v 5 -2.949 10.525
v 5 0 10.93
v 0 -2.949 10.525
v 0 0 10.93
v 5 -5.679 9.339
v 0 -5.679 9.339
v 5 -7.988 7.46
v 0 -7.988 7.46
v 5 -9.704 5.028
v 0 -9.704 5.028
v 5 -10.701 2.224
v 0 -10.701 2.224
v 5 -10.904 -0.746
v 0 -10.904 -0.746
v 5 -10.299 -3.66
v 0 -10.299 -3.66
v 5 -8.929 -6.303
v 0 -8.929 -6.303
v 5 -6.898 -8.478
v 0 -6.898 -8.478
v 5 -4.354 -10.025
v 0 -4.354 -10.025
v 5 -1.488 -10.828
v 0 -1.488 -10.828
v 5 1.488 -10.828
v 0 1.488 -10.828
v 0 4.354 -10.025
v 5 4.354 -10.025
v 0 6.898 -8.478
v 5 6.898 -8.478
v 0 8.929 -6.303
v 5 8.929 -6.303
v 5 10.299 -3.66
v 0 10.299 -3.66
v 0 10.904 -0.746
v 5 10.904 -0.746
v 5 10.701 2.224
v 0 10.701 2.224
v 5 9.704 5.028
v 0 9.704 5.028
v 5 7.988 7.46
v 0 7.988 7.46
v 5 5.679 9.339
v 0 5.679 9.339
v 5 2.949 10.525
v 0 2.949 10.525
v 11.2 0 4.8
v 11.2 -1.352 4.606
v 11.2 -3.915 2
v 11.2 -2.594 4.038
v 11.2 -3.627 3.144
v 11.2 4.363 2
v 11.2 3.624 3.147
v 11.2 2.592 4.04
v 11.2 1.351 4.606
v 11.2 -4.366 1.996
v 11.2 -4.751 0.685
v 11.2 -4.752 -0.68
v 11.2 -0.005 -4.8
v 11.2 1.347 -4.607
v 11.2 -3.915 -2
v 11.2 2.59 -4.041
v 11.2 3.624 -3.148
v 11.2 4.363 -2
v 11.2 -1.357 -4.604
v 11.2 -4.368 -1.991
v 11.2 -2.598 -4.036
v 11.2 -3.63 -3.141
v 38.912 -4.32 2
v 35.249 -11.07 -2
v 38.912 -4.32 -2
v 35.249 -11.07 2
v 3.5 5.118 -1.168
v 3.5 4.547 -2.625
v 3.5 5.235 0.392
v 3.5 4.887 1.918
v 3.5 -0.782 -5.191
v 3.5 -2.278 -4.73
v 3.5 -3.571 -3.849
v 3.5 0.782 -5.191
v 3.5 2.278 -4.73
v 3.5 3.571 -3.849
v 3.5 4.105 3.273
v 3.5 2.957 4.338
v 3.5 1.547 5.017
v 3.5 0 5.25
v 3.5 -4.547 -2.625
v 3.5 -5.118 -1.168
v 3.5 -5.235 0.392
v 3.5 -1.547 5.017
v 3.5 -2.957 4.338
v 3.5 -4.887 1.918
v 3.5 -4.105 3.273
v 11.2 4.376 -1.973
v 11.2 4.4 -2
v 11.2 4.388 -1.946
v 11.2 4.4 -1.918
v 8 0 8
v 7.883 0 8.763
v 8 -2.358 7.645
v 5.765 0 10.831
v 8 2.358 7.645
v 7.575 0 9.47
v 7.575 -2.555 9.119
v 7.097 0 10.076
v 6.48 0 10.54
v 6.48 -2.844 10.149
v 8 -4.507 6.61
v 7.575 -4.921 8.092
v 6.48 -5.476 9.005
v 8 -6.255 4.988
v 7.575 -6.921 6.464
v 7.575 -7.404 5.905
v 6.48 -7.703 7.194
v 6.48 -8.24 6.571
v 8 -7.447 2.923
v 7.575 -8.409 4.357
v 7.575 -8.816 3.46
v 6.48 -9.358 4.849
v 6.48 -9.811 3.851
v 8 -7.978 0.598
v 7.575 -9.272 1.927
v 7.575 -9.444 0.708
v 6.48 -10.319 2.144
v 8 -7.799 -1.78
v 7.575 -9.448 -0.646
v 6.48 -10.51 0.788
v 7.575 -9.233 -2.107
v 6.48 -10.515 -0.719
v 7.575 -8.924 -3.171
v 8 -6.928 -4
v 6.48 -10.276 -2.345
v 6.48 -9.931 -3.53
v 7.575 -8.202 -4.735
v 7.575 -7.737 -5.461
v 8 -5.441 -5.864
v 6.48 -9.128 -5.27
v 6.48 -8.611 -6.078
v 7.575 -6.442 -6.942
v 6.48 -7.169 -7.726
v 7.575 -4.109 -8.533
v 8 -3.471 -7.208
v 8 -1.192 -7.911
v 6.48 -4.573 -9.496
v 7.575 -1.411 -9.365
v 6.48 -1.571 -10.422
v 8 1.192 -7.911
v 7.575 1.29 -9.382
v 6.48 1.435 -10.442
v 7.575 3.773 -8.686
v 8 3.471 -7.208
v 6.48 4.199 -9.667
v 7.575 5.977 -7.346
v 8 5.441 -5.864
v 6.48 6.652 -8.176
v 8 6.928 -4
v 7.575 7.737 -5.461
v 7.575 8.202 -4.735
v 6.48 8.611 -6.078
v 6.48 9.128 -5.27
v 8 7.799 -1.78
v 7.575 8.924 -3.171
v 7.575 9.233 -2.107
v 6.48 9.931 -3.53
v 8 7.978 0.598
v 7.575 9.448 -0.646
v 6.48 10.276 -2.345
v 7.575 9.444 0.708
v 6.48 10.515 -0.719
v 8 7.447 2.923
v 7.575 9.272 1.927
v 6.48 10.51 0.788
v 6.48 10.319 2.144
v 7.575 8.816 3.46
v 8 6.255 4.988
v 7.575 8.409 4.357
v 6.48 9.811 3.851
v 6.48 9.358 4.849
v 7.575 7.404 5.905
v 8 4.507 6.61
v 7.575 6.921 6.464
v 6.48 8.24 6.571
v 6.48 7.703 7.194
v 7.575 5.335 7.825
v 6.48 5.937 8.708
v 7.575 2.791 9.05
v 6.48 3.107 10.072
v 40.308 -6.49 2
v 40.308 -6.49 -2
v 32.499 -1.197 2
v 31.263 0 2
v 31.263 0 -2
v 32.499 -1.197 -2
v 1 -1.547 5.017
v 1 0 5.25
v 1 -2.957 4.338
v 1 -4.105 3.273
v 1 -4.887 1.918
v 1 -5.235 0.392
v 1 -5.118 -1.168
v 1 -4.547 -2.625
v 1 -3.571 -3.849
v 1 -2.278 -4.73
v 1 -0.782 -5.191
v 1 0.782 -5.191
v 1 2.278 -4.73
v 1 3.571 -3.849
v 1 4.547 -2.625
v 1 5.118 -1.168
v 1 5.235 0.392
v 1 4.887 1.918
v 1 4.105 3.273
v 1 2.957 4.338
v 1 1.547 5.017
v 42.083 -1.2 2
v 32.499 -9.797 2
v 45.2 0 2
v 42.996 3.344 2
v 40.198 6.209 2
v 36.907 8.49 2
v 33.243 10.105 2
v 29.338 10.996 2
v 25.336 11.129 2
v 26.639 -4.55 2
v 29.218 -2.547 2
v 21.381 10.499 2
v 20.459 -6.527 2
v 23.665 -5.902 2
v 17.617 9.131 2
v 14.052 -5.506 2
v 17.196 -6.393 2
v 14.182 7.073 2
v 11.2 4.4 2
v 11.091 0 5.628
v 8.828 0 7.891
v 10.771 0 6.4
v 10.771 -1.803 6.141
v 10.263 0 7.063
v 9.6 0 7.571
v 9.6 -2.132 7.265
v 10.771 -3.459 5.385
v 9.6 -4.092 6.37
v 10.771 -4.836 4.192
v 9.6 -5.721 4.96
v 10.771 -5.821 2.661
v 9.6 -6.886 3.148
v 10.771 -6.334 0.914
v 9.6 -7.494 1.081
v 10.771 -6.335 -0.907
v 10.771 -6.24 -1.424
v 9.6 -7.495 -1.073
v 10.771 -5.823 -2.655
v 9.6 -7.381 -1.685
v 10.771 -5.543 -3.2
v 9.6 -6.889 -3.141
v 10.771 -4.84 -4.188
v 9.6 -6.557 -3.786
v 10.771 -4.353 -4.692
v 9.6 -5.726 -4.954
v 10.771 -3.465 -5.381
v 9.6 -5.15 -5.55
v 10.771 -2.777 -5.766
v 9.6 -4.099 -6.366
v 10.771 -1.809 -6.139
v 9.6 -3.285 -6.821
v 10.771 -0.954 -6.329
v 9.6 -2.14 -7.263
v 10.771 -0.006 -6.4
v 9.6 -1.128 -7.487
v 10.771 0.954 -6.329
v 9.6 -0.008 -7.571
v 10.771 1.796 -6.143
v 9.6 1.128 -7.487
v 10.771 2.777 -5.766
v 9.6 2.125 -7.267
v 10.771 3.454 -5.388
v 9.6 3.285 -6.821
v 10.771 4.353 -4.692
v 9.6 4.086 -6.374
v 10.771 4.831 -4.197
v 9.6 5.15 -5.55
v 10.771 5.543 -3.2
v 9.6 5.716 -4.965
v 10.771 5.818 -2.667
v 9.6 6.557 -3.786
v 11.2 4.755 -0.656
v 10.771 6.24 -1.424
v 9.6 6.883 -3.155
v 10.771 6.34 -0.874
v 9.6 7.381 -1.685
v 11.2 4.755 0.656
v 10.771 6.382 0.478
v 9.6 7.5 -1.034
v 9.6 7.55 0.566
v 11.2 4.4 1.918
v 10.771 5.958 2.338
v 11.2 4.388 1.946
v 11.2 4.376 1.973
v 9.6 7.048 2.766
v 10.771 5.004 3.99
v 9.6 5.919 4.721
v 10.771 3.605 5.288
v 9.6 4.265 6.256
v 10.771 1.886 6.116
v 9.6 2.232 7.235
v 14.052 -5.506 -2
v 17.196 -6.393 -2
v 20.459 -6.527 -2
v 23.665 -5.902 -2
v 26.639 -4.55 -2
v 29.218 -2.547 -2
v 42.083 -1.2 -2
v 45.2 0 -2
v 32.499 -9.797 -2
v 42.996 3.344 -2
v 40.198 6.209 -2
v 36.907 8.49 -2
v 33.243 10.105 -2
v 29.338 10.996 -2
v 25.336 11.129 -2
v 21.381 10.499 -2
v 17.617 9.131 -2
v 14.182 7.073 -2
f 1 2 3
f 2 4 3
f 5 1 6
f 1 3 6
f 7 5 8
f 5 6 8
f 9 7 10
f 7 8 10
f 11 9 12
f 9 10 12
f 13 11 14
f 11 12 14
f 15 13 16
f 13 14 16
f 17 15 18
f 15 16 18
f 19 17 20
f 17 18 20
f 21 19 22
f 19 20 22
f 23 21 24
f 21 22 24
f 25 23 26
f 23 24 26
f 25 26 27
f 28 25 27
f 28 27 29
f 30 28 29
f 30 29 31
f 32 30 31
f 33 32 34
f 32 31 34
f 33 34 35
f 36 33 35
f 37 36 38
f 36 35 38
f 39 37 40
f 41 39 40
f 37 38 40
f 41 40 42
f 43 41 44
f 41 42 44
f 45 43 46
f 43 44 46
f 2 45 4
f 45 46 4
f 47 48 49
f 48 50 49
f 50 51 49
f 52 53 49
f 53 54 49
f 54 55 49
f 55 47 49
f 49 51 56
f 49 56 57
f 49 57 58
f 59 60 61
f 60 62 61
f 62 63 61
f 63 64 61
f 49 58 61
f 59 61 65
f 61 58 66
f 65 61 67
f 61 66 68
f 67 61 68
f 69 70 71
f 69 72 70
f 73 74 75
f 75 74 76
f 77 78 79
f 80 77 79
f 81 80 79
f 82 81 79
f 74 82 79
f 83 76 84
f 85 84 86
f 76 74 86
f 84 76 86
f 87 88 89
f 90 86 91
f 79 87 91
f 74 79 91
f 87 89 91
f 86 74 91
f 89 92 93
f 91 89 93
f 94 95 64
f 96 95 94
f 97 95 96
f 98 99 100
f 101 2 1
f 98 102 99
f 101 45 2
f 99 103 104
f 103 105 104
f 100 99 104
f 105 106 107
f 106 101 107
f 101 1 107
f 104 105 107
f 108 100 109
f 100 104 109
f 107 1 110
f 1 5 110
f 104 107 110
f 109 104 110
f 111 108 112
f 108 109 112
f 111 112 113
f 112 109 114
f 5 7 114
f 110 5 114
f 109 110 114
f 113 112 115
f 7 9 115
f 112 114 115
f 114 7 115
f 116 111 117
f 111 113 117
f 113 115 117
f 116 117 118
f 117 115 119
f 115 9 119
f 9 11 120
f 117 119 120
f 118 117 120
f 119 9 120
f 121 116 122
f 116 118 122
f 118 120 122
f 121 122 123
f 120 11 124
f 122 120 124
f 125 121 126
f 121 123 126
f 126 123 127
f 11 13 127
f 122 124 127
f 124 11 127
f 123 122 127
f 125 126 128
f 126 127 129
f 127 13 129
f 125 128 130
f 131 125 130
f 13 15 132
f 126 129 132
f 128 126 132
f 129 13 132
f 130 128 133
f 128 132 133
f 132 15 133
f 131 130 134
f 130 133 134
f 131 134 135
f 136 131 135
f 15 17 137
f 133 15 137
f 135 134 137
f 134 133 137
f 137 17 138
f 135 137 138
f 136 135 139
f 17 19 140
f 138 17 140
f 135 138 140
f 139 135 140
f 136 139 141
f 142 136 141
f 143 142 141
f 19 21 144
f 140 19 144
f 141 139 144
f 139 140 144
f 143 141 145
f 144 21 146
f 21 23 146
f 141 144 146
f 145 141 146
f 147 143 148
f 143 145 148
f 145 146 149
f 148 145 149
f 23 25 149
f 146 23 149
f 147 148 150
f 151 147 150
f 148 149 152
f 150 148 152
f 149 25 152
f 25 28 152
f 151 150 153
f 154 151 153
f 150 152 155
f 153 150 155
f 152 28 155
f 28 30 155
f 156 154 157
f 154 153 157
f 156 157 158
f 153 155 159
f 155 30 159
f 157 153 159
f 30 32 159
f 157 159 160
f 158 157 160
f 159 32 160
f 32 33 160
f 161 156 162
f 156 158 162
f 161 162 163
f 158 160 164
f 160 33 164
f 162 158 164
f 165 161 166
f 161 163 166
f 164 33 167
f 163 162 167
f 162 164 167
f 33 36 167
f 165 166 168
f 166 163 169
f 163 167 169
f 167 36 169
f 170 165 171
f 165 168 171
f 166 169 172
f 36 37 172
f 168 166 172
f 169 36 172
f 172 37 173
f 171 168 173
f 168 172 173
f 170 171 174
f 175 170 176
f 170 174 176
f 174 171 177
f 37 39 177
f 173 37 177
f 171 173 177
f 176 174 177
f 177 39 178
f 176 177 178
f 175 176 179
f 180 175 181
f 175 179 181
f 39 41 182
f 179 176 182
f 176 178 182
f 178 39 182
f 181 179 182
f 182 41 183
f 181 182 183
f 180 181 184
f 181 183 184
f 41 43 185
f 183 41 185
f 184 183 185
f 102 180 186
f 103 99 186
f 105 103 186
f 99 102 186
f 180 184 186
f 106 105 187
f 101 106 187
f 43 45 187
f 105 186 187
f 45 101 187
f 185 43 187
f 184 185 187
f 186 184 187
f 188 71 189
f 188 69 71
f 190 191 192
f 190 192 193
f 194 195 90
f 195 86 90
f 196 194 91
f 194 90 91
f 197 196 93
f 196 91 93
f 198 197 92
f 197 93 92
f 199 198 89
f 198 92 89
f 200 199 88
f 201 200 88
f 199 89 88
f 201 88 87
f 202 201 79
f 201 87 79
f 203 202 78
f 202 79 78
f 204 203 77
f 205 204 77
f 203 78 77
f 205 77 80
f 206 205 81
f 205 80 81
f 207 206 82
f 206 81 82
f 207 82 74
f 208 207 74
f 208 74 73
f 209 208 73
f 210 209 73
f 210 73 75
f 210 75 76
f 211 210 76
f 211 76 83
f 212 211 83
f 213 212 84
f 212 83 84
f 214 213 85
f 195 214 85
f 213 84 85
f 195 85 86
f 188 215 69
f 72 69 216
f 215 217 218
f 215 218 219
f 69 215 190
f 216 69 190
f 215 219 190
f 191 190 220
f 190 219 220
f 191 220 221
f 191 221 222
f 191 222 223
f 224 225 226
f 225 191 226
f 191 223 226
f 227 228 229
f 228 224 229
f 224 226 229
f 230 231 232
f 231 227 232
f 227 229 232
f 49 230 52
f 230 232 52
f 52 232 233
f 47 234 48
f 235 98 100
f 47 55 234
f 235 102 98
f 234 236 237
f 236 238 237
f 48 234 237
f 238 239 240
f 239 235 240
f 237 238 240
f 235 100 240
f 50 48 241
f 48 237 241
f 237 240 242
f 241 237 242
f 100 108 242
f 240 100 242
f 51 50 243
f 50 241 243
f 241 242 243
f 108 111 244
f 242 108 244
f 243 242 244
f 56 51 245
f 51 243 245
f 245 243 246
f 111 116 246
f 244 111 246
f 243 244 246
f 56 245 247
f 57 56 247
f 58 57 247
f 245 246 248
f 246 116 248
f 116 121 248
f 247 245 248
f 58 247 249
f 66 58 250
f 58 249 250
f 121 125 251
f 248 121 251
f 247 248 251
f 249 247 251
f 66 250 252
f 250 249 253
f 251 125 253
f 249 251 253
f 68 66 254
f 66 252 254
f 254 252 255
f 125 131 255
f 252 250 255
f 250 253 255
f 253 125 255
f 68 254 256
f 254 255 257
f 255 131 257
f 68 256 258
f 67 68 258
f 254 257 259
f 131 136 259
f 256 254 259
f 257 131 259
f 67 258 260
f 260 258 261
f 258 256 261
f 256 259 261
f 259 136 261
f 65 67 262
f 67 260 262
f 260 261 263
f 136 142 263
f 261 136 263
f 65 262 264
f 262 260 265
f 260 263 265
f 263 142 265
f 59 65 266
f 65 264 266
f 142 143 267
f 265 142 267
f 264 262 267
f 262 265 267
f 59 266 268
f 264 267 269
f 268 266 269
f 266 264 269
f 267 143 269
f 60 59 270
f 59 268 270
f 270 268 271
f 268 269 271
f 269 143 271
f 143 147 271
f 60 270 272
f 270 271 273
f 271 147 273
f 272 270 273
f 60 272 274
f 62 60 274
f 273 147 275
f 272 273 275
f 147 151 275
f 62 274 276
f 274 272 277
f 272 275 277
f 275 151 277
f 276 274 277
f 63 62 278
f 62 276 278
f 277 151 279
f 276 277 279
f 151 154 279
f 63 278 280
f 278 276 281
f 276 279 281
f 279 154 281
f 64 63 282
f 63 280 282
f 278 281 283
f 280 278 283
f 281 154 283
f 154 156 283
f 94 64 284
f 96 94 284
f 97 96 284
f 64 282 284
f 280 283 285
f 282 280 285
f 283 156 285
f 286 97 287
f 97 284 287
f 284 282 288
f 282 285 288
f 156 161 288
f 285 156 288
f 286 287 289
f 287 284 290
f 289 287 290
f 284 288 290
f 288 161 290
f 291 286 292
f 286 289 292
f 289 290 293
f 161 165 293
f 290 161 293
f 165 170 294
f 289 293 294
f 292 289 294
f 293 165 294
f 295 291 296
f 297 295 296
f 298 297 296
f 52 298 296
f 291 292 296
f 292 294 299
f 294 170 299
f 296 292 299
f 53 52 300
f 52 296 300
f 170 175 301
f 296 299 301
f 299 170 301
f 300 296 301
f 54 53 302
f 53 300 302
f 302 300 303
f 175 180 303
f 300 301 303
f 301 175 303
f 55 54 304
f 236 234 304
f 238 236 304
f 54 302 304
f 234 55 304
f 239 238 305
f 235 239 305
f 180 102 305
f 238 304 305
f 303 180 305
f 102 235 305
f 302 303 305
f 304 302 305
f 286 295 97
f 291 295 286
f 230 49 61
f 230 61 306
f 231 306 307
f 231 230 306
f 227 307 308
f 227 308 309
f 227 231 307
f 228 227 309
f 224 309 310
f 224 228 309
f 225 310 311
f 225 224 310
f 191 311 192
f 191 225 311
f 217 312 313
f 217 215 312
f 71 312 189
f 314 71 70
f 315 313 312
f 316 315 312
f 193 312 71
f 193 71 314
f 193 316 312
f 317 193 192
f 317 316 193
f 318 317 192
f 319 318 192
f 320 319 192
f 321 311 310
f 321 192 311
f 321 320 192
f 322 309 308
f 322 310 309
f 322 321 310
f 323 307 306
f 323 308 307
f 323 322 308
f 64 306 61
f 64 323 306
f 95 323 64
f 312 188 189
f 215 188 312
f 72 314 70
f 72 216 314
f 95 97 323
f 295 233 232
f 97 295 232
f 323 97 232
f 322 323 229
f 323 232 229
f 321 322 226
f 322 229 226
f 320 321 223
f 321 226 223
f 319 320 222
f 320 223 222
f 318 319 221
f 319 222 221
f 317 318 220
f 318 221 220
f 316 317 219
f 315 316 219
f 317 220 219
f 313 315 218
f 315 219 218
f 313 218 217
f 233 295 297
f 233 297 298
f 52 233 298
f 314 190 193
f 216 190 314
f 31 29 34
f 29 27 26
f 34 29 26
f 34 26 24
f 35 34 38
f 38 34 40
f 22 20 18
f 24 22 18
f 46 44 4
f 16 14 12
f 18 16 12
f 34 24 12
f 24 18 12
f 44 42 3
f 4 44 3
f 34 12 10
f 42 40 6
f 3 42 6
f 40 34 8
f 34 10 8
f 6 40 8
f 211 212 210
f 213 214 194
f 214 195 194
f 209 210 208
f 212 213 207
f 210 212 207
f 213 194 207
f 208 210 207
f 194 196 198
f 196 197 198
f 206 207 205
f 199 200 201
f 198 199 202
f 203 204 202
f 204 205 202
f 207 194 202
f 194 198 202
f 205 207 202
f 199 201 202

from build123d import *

# Parameters (mm, degrees)
EXTRUDE_2037_DEPTH = 2


with BuildPart() as part:
    # Sketch 227 → Повернуть1 (revolve)
    with BuildSketch(Plane.XY, mode=Mode.PRIVATE) as revolve_1_sk:
        with BuildLine():
            Line((0, 10.929858877), (0, 0))
            Line((0, 0), (1, 0))
            Line((1, 0), (1, 5.25))
            Line((1, 5.25), (3.5, 5.25))
            Line((3.5, 5.25), (3.5, 0))
            Line((3.5, 0), (8, 0))
            Line((8, 0), (8, 8))
            ThreePointArc((8, 8), (7.096901825, 10.076121155), (5, 10.929858877))
            Line((5, 10.929858877), (0, 10.929858877))
        make_face()
        with BuildLine():
            ThreePointArc((11.2, 4.8), (10.2627417, 7.0627417), (8, 8))
            Line((8, 8), (8, 0))
            Line((8, 0), (11.2, 0))
            Line((11.2, 0), (11.2, 2.4))
            Line((11.2, 2.4), (11.2, 4.8))
        make_face()
    revolve(revolve_1_sk.sketch.rotate(Axis((0, 0, 0), (1, 0, 0)), 90), axis=Axis((0, 0, 0), (1, 0, 0)))

    # Sketch 1020 → Extrude 2037 (add, symmetric)
    with BuildSketch(Plane.XY):
        with BuildLine():
            ThreePointArc((11.2, 4.4), (29.338267199, 10.995701086), (45.2, 0))
            Line((45.2, 0), (11.2, 0))
            Line((11.2, 0), (11.2, 4.4))
        make_face()
        with BuildLine():
            Line((31.263463773, 0), (11.2, 0))
            Line((11.2, 0), (11.2, -3.914978255))
            ThreePointArc((11.2, -3.914978255), (22.080678837, -6.30816882), (31.263463773, 0))
        make_face()
        Polygon((38.912013935, 0), (35.248695767, 0), (35.248695767, -11.07), (38.912013935, -4.32), align=None)
        Polygon((35.248695767, 0), (31.263463773, 0), (32.498964702, -1.197255299), (32.498964702, -9.797255299), (35.248695767, -11.07), align=None)
        Polygon((42.083014277, -1.2), (42.083014277, 0), (40.307542508, 0), (40.307542508, -6.49), align=None)
        Polygon((40.307542508, 0), (38.912013935, 0), (38.912013935, -4.32), (40.307542508, -6.49), align=None)
        Polygon((42.083014277, -1.2), (45.2, 0), (42.083014277, 0), align=None)
    extrude(amount=EXTRUDE_2037_DEPTH, both=True)


solid = part.part
